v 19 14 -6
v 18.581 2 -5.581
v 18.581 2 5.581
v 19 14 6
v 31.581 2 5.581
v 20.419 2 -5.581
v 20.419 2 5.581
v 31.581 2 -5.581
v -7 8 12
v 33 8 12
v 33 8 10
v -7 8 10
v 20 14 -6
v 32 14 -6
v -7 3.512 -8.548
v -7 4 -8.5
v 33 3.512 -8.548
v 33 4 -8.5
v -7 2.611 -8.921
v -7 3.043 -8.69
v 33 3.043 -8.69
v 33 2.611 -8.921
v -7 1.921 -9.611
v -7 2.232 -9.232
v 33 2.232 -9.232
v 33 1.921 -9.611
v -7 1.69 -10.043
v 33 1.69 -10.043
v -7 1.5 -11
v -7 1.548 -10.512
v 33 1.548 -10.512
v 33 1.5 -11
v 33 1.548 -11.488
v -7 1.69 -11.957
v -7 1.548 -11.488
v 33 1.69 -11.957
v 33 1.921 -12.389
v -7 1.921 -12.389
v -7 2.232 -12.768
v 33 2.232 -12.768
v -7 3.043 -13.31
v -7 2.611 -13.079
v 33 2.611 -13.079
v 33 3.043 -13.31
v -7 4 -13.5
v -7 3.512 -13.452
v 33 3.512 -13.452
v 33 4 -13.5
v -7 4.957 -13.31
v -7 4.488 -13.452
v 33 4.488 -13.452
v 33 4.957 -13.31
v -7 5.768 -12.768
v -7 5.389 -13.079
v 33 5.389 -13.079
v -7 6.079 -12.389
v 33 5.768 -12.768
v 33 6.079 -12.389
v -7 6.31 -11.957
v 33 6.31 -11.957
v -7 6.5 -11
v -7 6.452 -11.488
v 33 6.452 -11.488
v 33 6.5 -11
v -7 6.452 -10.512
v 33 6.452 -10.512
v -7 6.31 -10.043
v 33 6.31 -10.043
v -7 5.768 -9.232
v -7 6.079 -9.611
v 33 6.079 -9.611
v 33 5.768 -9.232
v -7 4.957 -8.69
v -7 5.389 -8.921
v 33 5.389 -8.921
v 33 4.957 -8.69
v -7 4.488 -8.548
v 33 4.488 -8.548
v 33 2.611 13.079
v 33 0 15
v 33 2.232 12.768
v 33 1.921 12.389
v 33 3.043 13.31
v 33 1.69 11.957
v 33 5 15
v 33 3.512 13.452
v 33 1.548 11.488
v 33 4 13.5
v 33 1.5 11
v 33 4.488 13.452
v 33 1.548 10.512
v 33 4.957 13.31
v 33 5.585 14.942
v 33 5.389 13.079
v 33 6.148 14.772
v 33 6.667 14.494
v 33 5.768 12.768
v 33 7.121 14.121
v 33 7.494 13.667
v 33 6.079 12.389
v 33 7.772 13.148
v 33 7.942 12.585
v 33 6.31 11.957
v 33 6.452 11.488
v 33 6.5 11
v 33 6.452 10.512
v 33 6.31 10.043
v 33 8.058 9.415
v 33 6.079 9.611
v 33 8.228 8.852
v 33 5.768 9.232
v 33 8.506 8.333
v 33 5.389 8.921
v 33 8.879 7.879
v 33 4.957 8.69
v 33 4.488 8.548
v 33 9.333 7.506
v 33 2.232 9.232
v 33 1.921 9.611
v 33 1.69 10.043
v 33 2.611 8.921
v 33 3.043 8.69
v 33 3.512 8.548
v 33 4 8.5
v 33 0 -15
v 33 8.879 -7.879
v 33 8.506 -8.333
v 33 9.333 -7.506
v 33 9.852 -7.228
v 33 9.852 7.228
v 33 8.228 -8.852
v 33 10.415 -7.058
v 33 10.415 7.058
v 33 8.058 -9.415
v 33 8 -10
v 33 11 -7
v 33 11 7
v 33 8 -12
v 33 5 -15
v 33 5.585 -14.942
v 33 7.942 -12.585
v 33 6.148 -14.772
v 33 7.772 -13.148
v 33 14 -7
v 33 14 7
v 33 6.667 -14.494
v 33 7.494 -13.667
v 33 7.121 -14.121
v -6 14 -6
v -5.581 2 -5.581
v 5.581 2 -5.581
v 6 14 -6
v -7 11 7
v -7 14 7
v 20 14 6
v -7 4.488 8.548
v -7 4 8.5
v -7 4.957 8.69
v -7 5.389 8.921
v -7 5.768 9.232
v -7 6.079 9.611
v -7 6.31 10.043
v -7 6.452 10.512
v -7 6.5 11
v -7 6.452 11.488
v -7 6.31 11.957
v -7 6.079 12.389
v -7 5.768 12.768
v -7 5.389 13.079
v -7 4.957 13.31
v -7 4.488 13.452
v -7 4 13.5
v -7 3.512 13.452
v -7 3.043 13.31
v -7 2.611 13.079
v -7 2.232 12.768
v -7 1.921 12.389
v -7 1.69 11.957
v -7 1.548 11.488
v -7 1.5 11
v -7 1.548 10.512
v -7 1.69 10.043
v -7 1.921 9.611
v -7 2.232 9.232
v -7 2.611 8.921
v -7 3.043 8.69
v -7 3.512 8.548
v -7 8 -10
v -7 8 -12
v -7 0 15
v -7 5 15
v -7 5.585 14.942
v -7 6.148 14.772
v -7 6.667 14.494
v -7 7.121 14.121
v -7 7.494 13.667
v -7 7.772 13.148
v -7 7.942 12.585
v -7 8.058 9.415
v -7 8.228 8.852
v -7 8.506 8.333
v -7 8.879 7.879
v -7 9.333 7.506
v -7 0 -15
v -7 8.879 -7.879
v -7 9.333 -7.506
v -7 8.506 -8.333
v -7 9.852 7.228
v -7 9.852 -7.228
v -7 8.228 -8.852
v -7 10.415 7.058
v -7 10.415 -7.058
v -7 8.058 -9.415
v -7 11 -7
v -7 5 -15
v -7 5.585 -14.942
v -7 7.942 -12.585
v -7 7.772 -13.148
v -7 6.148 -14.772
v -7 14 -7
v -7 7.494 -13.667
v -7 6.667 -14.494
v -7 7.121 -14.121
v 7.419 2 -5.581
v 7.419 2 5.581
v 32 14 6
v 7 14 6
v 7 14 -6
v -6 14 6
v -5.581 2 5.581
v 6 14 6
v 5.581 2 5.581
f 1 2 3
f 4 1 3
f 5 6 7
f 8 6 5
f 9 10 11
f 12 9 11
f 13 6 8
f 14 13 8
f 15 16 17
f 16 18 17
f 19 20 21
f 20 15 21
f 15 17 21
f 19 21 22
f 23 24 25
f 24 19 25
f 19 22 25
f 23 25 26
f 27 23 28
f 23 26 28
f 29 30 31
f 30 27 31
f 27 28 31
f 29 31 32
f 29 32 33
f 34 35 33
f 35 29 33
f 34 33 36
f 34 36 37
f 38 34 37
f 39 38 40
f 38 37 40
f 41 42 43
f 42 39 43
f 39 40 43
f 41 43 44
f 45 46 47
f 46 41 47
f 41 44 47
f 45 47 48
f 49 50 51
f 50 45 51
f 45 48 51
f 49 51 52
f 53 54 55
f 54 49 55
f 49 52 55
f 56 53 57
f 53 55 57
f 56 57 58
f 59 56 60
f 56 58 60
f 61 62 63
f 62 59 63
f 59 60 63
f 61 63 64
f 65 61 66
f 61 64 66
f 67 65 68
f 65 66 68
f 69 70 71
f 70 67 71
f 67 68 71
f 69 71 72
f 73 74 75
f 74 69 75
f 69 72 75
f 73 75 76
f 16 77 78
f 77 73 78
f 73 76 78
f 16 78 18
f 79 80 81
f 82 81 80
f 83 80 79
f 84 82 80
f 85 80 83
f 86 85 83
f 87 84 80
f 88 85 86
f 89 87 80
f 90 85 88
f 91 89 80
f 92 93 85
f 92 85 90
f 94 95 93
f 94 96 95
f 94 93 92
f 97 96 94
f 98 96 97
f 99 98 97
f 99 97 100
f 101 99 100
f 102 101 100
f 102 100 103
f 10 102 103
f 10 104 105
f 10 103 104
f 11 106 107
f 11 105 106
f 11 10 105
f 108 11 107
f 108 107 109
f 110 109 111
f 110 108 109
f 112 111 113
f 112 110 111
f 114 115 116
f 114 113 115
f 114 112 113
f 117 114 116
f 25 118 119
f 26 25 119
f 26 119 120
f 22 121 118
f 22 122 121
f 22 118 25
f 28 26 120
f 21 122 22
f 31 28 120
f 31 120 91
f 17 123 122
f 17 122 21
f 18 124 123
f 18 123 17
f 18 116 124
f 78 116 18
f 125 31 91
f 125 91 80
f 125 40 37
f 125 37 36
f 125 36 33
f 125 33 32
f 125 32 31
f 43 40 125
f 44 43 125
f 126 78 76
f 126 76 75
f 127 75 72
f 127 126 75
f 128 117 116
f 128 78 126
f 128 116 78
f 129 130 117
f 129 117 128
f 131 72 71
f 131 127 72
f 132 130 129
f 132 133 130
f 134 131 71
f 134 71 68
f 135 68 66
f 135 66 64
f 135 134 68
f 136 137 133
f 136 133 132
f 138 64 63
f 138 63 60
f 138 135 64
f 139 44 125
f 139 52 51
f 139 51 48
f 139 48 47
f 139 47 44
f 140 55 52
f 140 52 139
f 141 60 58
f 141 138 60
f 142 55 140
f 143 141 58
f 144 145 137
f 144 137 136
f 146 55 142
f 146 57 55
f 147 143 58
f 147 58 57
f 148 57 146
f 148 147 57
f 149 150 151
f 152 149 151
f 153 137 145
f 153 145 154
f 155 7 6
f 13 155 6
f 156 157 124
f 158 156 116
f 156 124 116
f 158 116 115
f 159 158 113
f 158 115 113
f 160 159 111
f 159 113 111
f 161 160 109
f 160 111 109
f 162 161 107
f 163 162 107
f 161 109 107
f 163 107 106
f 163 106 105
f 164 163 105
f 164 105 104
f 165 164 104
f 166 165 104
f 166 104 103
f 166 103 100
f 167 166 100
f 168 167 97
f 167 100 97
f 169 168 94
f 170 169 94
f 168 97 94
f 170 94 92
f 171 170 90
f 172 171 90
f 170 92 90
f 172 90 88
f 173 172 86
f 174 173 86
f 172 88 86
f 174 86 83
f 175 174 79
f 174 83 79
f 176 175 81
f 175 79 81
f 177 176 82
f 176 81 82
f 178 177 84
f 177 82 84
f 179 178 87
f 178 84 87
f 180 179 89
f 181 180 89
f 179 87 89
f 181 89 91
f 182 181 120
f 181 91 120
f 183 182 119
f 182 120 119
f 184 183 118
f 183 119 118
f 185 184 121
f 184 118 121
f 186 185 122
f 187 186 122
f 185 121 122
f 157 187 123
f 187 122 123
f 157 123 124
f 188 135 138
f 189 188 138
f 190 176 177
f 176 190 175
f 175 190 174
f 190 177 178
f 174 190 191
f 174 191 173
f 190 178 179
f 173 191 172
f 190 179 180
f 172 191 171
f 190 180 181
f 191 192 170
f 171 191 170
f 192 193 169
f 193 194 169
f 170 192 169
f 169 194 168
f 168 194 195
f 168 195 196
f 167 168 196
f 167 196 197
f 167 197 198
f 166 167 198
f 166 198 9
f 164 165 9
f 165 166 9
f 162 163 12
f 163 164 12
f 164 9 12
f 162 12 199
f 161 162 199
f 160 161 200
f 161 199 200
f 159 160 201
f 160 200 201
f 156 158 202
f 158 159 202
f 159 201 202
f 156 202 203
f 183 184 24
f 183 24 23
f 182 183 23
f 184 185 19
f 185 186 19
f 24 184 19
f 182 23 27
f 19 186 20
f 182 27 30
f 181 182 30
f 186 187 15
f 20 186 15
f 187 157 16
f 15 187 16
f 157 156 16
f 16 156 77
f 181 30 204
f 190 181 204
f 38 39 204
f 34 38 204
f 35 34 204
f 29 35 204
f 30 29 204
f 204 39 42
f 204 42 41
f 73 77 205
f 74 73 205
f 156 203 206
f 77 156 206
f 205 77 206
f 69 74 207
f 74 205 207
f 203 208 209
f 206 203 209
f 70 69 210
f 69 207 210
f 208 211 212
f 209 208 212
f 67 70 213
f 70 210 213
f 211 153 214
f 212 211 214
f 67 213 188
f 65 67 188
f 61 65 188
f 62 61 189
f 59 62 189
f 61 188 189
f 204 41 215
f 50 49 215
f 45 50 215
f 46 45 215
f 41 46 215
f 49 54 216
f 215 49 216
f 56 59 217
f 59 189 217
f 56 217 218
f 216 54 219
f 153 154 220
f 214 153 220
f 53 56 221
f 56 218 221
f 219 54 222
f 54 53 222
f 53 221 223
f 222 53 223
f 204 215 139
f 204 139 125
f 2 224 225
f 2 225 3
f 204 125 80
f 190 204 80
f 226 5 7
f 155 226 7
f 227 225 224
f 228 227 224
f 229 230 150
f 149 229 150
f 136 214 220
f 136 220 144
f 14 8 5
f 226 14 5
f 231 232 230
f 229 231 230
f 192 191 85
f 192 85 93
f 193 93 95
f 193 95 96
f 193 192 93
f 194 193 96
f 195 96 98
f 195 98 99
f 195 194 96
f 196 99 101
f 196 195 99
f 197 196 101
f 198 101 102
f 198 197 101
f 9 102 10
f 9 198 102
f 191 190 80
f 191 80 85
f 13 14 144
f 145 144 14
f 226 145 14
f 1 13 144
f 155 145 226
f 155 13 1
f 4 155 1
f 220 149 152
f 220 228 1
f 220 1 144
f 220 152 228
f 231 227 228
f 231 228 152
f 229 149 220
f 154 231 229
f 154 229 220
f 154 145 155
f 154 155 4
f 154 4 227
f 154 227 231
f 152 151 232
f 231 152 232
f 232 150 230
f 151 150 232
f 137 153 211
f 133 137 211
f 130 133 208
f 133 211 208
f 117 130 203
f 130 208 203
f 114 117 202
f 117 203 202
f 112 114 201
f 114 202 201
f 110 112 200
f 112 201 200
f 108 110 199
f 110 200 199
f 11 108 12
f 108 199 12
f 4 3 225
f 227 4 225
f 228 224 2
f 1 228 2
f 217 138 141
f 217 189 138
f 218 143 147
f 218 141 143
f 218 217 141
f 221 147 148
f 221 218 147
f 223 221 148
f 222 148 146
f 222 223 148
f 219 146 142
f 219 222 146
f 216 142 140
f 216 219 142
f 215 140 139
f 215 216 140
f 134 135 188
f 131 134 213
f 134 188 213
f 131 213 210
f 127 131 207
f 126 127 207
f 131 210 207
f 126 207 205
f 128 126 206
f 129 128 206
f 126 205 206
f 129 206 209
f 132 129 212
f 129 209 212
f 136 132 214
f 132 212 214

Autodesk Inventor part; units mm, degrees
ref_plane "YZ Plane" through (0, 0, 0) normal (1, 0, 0) x (0, 1, 0)
ref_plane "XZ Plane" through (0, 0, 0) normal (0, 1, 0) x (-1, 0, 0)
ref_plane "XY Plane" through (0, 0, 0) normal (0, 0, 1) x (1, 0, 0)
sketch "Sketch1" plane through (0, 0, 0) normal (0, 1, 0) x (-1, 0, 0)
  line L0 (-7, 7) -> (7, 7)
  line L1 (7, 7) -> (7, -7)
  line L2 (7, -7) -> (-7, -7)
  line L3 (-7, -7) -> (-7, 7)
  line L4 (-7, 7) -> (7, -7) construction
  line L5 (7, 7) -> (-7, -7) construction
  point P0 (0, 0)
  dimension "d0" = 14
  dimension "d1" = 14
extrude "Extrusion1" add sketch "Sketch1" along normal blind 14
sketch "Sketch2" plane through (0, 14, 0) normal (0, 1, 0) x (1, 0, 0)
  line L0 (6, -6) -> (-6, -6)
  line L1 (-6, -6) -> (-6, 6)
  line L2 (-6, 6) -> (6, 6)
  line L3 (6, 6) -> (6, -6)
  line L4 (6, -6) -> (-6, 6) construction
  line L5 (-6, -6) -> (6, 6) construction
  point P0 (0, 0)
  dimension "d4" = 12
  dimension "d5" = 12
extrude "Extrusion2" cut sketch "Sketch2" against normal blind 12 draft -2
pattern_linear "Rectangular Pattern1" count 3 spacing 13 along (1, 0, 0) of "Extrusion2", "Extrusion1"
sketch "Sketch3" plane through (33, 0, 7) normal (1, 0, 0) x (0, 0, -1)
  line L0 (0, 0) -> (0, 14) projected
  line L1 (0, 0) -> (-8, 0)
  line L2 (-8, 0) -> (-8, 8)
  line L3 (-8, 8) -> (0, 8)
  line L4 (0, 8) -> (0, 0)
  line L5 (-4, 8) -> (-4, 0) construction
  circle A0 centre (-4, 4) radius 2.5
  point P0 (7, 0)
  dimension "d11" = 8
  dimension "d12" = 8
  dimension "d13" = 5
extrude "Extrusion3" add sketch "Sketch3" against normal up to surface (40 mm away)
fillet "Fillet1" radius 3 2 edges at (13, 8, 15) (13, 8, 7)
mirror "Mirror1" about plane through (0, 0, 0) normal (0, 0, 1) of "Fillet1", "Extrusion3"
fillet_without_effect "Fillet2"
properties part number "Mould"
